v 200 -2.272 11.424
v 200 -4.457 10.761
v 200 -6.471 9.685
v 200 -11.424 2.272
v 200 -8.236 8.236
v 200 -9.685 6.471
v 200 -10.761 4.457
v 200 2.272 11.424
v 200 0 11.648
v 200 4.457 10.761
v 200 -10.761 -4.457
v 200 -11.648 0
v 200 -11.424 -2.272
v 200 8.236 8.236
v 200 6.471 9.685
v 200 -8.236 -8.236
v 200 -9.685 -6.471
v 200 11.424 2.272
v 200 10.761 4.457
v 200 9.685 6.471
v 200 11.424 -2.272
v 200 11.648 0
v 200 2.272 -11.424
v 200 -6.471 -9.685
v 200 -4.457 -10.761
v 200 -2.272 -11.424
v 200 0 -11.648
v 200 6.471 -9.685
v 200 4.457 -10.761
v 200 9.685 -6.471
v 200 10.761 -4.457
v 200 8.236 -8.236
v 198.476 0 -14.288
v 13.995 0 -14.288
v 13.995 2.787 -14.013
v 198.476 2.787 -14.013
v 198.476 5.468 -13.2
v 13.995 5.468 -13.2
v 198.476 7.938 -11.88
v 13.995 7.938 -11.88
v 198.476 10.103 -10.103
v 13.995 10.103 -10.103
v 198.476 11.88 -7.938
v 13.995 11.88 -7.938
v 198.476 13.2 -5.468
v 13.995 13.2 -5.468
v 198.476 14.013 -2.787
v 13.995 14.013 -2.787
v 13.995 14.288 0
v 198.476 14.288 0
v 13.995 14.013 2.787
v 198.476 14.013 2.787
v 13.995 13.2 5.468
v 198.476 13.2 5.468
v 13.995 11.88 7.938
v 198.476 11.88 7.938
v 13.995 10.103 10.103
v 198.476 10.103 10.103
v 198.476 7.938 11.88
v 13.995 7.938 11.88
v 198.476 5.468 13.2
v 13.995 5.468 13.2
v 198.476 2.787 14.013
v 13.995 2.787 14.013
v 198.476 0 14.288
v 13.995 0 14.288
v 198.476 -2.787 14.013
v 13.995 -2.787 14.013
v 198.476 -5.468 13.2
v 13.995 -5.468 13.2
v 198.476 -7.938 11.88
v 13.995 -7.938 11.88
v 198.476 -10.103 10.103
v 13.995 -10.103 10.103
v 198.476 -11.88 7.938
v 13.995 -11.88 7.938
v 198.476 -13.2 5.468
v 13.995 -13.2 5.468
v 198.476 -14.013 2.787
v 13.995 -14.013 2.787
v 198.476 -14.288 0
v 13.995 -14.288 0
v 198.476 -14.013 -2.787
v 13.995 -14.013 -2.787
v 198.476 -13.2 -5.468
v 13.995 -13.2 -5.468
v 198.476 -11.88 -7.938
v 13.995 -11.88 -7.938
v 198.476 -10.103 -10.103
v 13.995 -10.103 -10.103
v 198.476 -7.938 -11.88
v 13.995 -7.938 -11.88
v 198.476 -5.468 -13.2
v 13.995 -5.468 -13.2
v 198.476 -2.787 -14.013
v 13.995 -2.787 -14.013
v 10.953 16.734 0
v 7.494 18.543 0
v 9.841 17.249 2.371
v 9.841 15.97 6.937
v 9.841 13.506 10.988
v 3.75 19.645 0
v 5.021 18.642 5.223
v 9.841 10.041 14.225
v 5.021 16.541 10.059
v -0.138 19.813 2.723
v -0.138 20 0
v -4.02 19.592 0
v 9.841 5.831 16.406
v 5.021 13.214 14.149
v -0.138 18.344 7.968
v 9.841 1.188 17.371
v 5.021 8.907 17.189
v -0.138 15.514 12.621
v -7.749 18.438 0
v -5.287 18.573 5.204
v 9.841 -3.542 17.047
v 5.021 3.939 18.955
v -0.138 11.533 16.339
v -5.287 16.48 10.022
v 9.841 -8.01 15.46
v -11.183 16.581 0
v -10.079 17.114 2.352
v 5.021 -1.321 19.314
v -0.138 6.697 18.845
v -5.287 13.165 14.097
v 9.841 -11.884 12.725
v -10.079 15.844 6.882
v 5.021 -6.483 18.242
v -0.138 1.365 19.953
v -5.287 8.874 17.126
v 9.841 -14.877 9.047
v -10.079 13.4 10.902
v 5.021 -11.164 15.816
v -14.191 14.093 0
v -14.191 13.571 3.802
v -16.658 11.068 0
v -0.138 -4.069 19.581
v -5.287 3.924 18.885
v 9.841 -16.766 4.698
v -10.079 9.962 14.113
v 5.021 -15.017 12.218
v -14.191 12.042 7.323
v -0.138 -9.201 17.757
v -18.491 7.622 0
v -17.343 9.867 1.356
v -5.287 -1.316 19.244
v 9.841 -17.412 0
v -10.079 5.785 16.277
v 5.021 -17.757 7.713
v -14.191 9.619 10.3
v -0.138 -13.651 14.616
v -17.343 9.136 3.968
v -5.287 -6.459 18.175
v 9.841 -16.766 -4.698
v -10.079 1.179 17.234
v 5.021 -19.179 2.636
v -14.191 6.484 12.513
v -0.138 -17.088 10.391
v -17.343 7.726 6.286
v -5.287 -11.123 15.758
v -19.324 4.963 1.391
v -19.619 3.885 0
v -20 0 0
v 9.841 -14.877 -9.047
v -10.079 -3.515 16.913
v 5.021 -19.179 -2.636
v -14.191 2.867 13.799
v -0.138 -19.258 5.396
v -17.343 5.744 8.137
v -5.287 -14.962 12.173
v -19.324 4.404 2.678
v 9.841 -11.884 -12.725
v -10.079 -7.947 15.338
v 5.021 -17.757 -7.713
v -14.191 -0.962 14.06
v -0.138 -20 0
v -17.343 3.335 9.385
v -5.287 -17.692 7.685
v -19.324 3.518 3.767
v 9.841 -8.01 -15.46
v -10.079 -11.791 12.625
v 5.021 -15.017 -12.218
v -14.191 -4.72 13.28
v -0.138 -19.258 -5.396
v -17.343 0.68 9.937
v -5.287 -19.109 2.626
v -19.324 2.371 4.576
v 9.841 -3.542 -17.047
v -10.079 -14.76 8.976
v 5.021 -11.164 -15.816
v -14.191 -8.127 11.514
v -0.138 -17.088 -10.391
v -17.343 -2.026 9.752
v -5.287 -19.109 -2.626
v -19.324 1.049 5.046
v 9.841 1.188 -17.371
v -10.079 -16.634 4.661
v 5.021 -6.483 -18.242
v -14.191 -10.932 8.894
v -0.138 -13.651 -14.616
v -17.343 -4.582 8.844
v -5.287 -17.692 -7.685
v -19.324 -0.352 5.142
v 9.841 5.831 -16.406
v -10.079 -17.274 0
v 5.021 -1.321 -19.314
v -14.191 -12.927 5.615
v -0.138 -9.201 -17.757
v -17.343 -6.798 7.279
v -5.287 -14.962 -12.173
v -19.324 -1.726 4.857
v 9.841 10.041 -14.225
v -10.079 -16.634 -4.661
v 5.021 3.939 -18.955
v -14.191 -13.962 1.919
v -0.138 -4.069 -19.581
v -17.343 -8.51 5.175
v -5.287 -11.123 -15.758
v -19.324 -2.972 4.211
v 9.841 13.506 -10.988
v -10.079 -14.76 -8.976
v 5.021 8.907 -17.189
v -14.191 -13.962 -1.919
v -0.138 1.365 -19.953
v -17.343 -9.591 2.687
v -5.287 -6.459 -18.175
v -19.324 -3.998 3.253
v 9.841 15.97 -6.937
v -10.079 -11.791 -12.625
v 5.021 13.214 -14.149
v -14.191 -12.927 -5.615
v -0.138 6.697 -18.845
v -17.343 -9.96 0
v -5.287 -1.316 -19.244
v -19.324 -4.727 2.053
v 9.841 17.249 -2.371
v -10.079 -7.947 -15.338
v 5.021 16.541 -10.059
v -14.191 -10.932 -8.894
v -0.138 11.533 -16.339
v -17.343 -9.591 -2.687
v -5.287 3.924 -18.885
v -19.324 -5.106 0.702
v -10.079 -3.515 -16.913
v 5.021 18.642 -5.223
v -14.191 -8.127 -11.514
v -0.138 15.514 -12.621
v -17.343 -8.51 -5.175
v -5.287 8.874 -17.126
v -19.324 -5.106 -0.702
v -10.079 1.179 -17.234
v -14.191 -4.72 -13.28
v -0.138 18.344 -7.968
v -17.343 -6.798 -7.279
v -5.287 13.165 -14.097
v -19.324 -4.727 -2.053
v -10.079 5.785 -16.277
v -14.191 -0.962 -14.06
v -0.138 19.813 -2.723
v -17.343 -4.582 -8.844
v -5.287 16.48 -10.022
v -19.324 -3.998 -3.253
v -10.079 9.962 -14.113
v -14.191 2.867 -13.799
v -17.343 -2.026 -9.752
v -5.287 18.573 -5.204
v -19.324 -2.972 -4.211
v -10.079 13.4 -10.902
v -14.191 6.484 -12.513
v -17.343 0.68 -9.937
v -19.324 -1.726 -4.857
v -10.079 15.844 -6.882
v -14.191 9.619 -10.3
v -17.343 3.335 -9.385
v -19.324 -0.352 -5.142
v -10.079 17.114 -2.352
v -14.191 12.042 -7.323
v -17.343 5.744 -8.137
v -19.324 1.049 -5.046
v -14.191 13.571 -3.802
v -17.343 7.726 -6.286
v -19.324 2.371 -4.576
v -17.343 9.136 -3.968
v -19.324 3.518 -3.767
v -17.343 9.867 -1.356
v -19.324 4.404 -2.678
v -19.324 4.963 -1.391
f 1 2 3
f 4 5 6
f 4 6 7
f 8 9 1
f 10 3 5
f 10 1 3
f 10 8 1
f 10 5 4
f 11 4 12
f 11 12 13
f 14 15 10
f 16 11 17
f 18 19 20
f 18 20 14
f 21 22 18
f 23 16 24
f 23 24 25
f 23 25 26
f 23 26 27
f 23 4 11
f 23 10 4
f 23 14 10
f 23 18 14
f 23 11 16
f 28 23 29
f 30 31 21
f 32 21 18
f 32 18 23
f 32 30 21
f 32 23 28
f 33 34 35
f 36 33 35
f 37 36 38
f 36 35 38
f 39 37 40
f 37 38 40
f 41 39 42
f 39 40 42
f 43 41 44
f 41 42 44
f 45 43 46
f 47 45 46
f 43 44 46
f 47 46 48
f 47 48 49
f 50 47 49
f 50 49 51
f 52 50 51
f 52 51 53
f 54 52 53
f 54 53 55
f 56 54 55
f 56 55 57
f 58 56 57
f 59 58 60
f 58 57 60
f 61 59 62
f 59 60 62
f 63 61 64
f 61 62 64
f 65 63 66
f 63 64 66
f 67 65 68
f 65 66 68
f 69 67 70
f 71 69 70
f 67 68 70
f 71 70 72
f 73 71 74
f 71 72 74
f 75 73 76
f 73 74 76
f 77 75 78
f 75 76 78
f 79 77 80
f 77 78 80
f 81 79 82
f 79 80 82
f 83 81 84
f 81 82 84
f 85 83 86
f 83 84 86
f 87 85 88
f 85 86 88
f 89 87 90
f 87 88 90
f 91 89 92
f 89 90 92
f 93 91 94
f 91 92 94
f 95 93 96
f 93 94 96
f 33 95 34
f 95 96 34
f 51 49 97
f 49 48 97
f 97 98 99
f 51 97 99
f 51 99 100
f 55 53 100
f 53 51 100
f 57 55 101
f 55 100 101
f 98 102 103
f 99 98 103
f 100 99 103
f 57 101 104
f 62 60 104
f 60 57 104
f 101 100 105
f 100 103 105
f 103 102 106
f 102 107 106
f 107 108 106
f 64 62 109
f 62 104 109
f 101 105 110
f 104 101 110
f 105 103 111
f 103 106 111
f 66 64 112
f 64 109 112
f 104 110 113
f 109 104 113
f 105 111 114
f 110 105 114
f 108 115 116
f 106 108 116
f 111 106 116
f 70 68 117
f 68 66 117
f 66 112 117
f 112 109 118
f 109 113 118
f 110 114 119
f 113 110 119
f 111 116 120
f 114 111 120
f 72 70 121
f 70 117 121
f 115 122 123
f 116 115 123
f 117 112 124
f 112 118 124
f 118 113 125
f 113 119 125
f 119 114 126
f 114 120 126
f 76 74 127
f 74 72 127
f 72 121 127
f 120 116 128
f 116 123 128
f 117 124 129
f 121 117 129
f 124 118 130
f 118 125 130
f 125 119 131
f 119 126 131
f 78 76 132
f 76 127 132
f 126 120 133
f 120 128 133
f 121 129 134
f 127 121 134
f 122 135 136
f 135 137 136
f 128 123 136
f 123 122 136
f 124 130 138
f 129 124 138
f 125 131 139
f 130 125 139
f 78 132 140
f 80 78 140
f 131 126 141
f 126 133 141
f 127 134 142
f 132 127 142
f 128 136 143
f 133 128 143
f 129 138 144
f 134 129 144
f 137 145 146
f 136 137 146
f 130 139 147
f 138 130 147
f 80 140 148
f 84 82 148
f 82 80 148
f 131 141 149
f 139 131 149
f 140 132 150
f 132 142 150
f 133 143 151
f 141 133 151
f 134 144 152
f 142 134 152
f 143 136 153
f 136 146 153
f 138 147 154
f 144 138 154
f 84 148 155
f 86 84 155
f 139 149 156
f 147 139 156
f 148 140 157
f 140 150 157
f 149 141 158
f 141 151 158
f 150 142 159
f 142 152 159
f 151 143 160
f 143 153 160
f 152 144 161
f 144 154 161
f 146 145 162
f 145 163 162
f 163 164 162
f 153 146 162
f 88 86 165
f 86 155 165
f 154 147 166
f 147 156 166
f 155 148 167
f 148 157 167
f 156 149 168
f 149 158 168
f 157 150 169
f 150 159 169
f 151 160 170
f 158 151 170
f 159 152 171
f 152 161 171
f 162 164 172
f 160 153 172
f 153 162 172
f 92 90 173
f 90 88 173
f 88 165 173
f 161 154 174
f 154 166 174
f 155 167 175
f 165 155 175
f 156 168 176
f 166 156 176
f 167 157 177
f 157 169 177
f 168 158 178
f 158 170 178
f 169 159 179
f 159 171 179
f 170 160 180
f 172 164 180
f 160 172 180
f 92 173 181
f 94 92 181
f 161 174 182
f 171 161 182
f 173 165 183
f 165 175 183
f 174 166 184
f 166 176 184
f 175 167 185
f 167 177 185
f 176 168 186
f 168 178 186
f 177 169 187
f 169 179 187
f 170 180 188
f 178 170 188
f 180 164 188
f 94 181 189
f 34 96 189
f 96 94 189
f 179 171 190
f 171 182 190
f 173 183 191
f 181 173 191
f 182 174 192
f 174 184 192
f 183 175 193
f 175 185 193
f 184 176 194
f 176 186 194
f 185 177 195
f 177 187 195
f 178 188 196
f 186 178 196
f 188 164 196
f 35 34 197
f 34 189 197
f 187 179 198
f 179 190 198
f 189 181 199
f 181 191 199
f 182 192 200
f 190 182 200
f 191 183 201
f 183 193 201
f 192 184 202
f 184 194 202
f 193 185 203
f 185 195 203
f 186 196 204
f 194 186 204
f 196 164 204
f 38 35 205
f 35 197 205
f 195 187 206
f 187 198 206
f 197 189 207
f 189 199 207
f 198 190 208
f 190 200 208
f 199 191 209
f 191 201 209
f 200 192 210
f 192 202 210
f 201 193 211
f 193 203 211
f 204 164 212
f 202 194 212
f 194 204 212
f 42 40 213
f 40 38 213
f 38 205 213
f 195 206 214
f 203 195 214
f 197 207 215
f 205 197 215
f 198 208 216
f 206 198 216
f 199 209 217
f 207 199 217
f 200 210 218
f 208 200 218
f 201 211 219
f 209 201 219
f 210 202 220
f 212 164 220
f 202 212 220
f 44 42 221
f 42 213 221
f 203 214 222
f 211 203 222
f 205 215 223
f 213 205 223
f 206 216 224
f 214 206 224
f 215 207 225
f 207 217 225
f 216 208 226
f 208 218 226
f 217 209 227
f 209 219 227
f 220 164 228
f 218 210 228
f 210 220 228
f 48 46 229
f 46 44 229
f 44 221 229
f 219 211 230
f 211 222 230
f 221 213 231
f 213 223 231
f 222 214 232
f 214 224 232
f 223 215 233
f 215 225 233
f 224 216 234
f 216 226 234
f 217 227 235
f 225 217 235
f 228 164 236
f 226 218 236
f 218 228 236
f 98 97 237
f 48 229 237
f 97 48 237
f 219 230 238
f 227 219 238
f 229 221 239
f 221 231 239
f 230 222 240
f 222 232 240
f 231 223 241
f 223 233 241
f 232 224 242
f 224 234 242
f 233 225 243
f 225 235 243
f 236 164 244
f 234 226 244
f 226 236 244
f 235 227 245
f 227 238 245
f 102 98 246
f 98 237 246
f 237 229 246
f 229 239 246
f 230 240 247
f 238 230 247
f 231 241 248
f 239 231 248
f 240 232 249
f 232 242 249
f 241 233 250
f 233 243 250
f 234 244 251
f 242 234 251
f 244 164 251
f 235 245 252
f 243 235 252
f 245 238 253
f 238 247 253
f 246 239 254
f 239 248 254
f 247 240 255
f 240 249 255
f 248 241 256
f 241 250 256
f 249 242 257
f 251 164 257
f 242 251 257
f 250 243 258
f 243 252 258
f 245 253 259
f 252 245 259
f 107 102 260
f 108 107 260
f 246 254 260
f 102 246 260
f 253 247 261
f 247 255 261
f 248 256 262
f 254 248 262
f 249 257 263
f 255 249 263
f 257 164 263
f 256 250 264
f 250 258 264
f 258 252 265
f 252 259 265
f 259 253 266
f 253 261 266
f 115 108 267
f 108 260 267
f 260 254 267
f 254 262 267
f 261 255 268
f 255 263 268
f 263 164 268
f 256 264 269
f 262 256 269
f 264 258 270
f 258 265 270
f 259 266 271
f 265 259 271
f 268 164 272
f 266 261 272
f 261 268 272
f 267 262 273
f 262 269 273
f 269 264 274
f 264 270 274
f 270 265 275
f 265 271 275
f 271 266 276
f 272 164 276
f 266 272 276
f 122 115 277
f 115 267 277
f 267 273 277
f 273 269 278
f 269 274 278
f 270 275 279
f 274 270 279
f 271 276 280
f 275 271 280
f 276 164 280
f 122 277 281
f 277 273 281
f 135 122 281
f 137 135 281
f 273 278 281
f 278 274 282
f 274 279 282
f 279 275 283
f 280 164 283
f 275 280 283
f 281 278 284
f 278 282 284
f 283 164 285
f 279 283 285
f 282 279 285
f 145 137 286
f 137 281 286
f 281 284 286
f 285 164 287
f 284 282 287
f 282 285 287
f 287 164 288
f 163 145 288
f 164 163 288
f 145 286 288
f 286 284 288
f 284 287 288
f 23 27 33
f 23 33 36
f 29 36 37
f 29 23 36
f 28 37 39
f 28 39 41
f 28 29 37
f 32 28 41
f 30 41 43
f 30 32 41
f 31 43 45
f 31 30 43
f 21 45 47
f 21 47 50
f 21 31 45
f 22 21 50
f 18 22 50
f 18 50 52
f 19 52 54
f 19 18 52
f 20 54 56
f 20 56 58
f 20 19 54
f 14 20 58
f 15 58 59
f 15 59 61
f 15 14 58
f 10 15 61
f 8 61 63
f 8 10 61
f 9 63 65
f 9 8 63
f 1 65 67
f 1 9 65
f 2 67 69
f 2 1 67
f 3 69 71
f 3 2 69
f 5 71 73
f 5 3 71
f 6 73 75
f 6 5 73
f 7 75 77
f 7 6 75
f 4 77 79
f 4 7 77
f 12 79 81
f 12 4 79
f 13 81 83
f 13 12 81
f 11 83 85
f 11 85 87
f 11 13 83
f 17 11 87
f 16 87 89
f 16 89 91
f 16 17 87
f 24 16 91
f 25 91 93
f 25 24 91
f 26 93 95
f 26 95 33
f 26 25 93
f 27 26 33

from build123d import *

# Parameters (mm, degrees)
SKETCH1_R           = 14.2875
BOSS_EXTRUDE1_DEPTH = 200
CHAMFER1_SIZE       = 1.524
CHAMFER1_SIZE2      = 2.639645431


with BuildPart() as part:
    # Sketch1 → Boss-Extrude1 (new body)
    with BuildSketch(Plane(origin=(0, 0, 0), x_dir=(0, 0, -1), z_dir=(1, 0, 0))):
        Circle(SKETCH1_R)
    extrude(amount=BOSS_EXTRUDE1_DEPTH)

    # Chamfer1
    chamfer1_edges = [part.edges().sort_by_distance(p)[0] for p in [
        (200, 0, 14.2875),
    ]]
    chamfer1_side = [part.faces().sort_by_distance(p)[0] for p in [
        (100, 0, 14.2875),
    ]]
    chamfer(chamfer1_edges, length=CHAMFER1_SIZE, length2=CHAMFER1_SIZE2, reference=chamfer1_side[0])

    # Sketch4 → Revolve1 (revolve)
    with BuildSketch(Plane.XY):
        with BuildLine():
            Line((-20, 0), (20, 0))
            ThreePointArc((20, 0), (0, 20), (-20, 0))
        make_face()
    revolve(axis=Axis((0, 0, 0), (1, 0, 0)))


solid = part.part
